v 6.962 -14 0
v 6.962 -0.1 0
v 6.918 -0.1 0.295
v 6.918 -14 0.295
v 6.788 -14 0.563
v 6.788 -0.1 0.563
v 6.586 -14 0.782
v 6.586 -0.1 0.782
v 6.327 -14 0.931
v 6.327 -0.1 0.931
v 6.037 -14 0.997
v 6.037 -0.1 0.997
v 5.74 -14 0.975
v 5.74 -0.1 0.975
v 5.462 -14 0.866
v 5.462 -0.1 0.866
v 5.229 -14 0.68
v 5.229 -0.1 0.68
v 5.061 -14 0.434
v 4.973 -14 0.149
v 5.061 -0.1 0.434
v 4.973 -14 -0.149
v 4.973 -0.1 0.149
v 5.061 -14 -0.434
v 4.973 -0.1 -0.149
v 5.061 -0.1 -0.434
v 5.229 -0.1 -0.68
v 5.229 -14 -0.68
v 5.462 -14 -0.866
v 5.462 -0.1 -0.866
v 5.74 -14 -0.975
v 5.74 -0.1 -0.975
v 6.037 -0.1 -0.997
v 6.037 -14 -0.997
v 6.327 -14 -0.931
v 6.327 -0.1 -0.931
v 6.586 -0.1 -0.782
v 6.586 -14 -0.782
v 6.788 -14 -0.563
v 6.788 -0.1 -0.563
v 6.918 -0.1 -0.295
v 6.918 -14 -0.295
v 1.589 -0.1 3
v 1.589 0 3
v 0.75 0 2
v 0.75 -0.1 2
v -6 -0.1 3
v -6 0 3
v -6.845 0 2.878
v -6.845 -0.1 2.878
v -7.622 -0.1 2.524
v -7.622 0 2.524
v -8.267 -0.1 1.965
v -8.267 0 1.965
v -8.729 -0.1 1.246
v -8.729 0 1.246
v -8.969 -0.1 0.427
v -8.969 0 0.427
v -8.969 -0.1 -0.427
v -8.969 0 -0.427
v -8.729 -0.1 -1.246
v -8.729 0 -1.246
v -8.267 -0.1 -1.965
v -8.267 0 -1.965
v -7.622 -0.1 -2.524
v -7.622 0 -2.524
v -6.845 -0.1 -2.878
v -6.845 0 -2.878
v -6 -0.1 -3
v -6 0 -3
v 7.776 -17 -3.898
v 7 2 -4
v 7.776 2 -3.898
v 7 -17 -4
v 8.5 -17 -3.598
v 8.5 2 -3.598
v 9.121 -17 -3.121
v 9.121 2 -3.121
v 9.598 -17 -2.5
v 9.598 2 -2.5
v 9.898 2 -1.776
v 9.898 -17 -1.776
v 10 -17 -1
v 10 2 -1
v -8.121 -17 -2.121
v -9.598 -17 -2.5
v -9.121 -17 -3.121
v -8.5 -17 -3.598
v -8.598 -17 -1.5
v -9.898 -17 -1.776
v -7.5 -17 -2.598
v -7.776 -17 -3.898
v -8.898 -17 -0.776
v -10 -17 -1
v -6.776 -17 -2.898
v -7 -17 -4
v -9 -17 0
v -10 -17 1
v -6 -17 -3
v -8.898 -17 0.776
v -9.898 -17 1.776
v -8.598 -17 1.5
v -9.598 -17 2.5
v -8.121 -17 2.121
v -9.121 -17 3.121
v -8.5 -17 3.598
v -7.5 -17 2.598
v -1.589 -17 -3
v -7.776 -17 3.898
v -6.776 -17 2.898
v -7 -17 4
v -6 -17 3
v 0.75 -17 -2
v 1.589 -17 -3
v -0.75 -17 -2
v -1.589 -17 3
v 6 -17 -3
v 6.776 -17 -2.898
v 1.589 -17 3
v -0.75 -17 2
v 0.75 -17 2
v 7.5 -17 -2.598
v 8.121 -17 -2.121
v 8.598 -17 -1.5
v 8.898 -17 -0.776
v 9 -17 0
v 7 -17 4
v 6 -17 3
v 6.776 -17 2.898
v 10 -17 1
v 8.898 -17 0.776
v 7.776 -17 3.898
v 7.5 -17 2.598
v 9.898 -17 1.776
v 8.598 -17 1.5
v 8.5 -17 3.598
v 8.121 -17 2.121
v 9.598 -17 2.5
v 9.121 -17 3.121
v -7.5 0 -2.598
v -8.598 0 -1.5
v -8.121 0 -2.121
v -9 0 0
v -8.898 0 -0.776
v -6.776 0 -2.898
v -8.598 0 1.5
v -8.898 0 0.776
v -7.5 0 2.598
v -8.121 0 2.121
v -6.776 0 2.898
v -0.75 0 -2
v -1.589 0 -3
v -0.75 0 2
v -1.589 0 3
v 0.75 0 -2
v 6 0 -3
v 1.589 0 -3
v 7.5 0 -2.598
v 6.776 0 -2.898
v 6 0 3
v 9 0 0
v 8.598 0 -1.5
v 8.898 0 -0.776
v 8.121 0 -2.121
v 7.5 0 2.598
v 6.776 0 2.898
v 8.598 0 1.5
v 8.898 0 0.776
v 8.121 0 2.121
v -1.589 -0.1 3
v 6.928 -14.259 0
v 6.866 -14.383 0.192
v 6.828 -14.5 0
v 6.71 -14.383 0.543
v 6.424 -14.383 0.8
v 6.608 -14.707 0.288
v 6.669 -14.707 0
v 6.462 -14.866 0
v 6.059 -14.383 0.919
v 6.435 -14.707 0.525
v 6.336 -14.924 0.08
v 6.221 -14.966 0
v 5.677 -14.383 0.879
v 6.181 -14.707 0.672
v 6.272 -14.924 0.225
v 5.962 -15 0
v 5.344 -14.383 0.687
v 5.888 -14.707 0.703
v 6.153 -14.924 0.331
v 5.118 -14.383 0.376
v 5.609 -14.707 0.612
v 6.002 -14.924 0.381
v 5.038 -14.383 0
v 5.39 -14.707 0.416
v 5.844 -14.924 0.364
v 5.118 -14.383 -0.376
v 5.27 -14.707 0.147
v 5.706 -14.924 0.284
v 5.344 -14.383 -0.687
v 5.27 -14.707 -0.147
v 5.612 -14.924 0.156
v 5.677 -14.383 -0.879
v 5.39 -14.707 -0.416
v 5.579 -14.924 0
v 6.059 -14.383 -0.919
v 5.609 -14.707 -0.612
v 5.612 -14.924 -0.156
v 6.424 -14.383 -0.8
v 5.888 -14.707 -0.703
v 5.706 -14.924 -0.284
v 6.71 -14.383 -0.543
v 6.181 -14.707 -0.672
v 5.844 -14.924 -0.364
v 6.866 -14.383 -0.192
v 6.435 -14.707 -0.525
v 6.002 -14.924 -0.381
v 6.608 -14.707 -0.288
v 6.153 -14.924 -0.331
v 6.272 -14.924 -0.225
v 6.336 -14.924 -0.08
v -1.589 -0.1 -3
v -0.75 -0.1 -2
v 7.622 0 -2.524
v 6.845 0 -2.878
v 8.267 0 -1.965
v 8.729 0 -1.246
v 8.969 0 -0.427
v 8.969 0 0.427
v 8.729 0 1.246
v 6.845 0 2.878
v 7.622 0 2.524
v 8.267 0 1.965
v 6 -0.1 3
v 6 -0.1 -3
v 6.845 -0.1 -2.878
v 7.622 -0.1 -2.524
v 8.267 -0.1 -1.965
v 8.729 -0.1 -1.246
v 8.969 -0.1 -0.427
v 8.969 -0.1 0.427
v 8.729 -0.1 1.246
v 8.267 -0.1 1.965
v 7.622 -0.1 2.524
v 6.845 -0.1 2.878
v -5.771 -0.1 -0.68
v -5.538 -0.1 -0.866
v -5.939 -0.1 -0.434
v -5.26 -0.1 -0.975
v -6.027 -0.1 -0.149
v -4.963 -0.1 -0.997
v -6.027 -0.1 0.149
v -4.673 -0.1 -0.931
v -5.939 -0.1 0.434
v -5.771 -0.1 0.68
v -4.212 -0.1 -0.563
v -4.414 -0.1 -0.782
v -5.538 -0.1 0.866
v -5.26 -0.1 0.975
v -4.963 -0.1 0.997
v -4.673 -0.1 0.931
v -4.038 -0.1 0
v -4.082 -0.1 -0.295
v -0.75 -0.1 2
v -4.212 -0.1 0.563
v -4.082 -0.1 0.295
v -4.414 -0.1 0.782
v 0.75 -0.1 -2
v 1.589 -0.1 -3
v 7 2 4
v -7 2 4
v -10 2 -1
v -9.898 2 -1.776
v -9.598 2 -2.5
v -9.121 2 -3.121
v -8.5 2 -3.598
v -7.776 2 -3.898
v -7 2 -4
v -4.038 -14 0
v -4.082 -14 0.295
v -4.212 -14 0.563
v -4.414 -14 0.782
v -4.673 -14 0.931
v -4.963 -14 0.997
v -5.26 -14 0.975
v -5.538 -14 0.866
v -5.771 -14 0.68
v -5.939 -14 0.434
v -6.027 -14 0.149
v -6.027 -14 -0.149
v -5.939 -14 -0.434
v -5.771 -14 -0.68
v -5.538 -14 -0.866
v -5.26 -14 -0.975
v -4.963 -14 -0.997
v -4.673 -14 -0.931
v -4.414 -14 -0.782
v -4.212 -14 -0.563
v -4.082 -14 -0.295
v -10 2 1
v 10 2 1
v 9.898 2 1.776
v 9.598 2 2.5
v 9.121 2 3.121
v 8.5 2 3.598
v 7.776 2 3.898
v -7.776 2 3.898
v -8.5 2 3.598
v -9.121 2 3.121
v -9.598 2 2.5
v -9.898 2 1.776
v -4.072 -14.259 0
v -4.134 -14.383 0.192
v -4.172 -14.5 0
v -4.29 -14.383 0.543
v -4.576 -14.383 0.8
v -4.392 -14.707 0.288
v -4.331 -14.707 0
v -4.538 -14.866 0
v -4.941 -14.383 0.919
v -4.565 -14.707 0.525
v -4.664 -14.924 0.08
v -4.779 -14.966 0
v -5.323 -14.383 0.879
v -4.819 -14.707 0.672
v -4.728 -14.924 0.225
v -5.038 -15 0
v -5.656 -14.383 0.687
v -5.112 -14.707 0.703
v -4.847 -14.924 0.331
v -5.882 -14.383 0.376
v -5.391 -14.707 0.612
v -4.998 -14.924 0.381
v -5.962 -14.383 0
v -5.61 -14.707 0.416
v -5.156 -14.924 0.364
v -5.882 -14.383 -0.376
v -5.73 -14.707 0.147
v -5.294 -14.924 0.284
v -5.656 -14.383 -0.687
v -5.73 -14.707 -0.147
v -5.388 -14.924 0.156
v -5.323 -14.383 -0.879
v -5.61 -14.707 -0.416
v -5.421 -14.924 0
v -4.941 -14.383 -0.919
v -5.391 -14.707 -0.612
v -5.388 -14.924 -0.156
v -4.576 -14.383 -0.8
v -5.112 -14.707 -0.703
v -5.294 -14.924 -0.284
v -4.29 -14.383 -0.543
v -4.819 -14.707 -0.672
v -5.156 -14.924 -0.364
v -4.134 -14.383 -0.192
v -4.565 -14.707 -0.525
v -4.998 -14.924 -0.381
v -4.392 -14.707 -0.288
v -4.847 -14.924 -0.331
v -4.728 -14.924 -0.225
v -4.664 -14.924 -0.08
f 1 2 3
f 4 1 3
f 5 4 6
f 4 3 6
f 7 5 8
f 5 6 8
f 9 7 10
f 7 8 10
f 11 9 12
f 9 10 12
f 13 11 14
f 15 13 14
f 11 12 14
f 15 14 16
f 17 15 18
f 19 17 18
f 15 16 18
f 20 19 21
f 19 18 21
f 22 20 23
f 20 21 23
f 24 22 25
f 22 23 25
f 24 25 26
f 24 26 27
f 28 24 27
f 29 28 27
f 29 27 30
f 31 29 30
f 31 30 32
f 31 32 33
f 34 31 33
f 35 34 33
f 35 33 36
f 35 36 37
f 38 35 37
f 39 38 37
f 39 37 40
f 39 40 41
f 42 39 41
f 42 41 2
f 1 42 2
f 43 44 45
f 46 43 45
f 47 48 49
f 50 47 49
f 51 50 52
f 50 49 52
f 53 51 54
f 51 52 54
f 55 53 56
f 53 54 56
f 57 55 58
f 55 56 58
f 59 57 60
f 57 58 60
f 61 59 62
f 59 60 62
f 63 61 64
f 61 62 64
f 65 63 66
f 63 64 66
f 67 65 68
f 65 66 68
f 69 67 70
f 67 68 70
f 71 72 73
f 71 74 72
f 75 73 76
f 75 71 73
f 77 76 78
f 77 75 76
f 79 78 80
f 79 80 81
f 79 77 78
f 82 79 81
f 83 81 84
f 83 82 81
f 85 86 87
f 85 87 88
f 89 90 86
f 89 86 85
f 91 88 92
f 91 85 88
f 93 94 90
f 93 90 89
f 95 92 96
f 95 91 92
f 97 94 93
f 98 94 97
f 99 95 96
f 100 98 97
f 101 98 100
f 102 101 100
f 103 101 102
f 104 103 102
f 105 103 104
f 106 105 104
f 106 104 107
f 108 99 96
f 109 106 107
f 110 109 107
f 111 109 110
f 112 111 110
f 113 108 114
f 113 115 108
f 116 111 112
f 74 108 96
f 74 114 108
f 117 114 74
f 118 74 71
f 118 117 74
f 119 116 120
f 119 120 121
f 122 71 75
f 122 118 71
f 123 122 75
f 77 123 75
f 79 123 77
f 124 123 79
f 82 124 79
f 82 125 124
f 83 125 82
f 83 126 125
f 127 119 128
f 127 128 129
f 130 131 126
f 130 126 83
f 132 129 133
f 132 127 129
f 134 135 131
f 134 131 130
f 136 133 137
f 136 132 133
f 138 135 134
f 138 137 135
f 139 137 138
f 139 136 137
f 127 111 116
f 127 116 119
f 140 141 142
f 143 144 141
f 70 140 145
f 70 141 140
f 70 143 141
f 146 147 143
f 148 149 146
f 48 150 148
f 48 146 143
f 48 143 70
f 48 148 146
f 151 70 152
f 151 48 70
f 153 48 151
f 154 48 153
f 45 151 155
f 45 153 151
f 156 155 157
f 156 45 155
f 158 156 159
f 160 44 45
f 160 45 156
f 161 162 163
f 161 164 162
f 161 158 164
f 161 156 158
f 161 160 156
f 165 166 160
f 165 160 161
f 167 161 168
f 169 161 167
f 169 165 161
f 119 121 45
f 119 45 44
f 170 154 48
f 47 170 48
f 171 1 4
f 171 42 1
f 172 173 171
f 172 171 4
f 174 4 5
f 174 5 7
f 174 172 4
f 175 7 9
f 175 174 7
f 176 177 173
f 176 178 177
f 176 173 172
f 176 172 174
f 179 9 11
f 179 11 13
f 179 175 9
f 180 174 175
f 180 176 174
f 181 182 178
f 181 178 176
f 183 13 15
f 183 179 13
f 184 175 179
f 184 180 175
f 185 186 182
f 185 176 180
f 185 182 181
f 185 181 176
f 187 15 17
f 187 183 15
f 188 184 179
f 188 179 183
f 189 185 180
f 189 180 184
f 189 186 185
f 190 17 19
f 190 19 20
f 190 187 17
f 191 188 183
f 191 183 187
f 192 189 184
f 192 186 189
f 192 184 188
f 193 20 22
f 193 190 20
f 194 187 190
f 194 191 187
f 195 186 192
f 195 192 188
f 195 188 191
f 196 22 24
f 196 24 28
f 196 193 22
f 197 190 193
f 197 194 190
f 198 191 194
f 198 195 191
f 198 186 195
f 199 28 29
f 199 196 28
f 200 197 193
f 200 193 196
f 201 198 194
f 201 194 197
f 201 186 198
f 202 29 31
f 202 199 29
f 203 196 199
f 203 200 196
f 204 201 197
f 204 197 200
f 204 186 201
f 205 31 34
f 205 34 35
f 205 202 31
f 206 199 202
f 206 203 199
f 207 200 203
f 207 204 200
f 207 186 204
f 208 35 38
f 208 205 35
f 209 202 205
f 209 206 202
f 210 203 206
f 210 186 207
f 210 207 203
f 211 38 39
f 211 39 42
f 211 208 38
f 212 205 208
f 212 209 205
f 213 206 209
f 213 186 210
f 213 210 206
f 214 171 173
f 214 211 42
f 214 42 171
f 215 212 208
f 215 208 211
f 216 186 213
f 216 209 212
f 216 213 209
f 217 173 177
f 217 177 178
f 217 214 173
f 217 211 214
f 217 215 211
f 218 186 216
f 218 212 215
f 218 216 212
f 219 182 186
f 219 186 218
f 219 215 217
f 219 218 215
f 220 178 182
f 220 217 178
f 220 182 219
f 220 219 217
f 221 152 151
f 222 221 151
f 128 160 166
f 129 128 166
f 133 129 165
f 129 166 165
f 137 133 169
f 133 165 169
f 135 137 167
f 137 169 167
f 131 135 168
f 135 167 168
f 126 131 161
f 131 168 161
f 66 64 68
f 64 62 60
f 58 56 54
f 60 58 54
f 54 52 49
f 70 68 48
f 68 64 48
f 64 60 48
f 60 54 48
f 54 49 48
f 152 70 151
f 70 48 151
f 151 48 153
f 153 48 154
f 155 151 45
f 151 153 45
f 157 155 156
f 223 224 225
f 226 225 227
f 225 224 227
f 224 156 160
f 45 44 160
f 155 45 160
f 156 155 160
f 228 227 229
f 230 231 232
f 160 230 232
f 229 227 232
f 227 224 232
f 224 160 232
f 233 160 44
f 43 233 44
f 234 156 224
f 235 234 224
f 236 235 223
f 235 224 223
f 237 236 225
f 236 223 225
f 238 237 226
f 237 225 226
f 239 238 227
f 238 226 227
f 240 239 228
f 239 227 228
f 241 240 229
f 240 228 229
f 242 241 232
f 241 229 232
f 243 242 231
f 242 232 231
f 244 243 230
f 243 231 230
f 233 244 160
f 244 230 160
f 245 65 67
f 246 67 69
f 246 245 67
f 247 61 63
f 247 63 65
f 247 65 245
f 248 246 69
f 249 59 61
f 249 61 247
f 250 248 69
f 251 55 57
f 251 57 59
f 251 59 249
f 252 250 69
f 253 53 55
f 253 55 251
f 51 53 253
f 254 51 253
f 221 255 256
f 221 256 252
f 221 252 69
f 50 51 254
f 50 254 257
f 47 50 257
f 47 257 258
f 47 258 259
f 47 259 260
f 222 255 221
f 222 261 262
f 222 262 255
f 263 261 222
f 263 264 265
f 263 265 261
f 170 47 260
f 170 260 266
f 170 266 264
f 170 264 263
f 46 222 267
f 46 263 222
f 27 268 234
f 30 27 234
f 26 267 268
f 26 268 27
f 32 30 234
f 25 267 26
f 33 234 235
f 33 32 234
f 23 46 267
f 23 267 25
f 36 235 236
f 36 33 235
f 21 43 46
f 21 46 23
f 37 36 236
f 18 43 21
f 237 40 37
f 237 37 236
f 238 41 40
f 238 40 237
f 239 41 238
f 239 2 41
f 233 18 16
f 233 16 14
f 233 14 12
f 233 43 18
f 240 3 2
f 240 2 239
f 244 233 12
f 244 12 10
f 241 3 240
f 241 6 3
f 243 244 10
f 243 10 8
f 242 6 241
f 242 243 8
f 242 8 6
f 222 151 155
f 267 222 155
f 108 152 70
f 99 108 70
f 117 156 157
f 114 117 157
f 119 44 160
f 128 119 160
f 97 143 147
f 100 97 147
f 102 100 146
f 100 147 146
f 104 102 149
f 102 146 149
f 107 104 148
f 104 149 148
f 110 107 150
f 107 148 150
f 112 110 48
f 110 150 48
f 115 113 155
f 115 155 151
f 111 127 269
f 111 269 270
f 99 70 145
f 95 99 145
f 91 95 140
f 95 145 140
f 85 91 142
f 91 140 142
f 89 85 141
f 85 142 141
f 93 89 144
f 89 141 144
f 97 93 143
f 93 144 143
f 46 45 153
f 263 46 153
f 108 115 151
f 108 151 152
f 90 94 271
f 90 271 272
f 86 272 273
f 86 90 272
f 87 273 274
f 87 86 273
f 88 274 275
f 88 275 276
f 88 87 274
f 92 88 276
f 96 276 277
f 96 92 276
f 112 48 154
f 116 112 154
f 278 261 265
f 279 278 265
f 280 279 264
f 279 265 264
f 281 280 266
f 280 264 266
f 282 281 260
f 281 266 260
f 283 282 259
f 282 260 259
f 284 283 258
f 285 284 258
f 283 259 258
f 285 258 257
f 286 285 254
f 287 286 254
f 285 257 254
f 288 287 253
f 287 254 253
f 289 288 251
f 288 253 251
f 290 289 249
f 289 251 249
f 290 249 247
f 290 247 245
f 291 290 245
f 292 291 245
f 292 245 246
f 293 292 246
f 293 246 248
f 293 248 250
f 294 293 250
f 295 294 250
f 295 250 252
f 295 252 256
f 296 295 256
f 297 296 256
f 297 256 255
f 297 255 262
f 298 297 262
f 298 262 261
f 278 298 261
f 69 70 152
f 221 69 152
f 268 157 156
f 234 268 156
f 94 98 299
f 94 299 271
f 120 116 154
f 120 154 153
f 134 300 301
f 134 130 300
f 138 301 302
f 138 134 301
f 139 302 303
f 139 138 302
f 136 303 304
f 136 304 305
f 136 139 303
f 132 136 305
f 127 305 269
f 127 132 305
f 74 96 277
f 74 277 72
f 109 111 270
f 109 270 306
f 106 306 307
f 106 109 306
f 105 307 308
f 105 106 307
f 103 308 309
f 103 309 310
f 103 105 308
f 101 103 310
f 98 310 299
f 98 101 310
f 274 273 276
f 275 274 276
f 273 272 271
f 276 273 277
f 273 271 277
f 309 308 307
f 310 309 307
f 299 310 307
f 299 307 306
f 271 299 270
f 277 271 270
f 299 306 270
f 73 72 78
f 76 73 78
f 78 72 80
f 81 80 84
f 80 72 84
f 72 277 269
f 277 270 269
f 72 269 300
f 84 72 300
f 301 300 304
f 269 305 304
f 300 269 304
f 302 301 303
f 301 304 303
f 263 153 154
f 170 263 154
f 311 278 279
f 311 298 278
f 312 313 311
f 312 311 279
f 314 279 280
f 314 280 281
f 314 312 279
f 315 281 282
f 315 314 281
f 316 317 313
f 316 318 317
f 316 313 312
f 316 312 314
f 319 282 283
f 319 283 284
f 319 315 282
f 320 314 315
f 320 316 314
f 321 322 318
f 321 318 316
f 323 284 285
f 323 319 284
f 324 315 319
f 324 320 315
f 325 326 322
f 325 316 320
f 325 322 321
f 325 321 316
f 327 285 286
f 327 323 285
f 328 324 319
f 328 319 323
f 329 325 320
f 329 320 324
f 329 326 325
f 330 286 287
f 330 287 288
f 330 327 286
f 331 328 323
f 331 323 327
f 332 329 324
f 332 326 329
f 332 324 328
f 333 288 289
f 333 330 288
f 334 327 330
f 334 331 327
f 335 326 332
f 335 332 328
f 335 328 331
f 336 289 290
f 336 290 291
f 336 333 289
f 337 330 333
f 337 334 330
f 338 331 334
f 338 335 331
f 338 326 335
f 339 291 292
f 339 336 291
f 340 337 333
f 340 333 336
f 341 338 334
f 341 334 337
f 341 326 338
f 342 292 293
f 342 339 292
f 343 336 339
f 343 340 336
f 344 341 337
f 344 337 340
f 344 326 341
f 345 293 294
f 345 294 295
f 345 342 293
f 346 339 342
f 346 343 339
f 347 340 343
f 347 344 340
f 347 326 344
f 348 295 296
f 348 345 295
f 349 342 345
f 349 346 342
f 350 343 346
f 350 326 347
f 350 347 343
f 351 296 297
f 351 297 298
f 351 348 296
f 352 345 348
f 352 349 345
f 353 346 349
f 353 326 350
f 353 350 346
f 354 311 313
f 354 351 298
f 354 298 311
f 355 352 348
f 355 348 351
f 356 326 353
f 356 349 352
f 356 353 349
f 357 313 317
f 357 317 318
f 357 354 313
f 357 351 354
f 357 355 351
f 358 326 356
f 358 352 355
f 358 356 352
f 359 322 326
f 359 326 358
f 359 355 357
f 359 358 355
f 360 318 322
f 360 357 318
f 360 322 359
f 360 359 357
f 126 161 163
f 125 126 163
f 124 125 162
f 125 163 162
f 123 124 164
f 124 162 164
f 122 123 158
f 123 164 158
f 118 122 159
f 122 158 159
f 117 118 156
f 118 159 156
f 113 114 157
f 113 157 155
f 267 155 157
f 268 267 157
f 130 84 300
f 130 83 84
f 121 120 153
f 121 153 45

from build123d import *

# Parameters (mm, degrees)
F1_DEPTH = 17
F2_R     = 1
F3_DEPTH = 15
F4_R     = 1
F4_2_R   = 1
F6_DEPTH = 2
F8_DEPTH = 0.1


with BuildPart() as f1:
    # F0 (on Front) → F1 (new body)
    with BuildSketch(Plane.XZ):
        with BuildLine():
            ThreePointArc((10, 1), (9.1213203436, 3.1213203436), (7, 4))
            Line((7, 4), (-7, 4))
            ThreePointArc((-7, 4), (-9.1213203436, 3.1213203436), (-10, 1))
            Line((-10, 1), (-10, -1))
            ThreePointArc((-10, -1), (-9.1213203436, -3.1213203436), (-7, -4))
            Line((-7, -4), (7, -4))
            ThreePointArc((7, -4), (9.1213203436, -3.1213203436), (10, -1))
            Line((10, -1), (10, 1))
        make_face()
        with BuildLine():
            ThreePointArc((-9, 0), (-8.1213203436, 2.1213203436), (-6, 3))
            Line((-6, 3), (-1.5890996312, 3))
            Line((-1.5890996312, 3), (-0.75, 2))
            Line((-0.75, 2), (0, 2))
            Line((0, 2), (0.75, 2))
            Line((0.75, 2), (1.5890996312, 3))
            Line((1.5890996312, 3), (6, 3))
            ThreePointArc((6, 3), (8.1213203436, 2.1213203436), (9, 0))
            ThreePointArc((9, 0), (8.1213203436, -2.1213203436), (6, -3))
            Line((6, -3), (1.5890996312, -3))
            Line((1.5890996312, -3), (0.75, -2))
            Line((0.75, -2), (0, -2))
            Line((0, -2), (-0.75, -2))
            Line((-0.75, -2), (-1.5890996312, -3))
            Line((-1.5890996312, -3), (-6, -3))
            ThreePointArc((-6, -3), (-8.1213203436, -2.1213203436), (-9, 0))
        make_face(mode=Mode.SUBTRACT)
    extrude(amount=F1_DEPTH)

    # F5 (on face) → F6 (join)
    with BuildSketch(Plane.XZ):
        with BuildLine():
            ThreePointArc((10, 1), (9.1213203436, 3.1213203436), (7, 4))
            Line((7, 4), (-7, 4))
            ThreePointArc((-7, 4), (-9.1213203436, 3.1213203436), (-10, 1))
            Line((-10, 1), (-10, -1))
            ThreePointArc((-10, -1), (-9.1213203436, -3.1213203436), (-7, -4))
            Line((-7, -4), (7, -4))
            ThreePointArc((7, -4), (9.1213203436, -3.1213203436), (10, -1))
            Line((10, -1), (10, 1))
        make_face()
    extrude(amount=-F6_DEPTH)


with BuildPart() as f3:
    # F2 (on Front) → F3 (new body)
    with BuildSketch(Plane.XZ):
        with Locations((-5.0379058985, 0)):
            Circle(F2_R)
    extrude(amount=F3_DEPTH)

    # F4
    f4_edges = [f3.edges().sort_by_distance(p)[0] for p in [
        (-6.037906, -15, 0),
    ]]
    fillet(f4_edges, radius=F4_R)



with BuildPart() as f3b:
    # F2 (on Front) → F3, piece 2 (new body)
    with BuildSketch(Plane.XZ):
        with Locations((5.9620941015, 0)):
            Circle(F2_R)
    extrude(amount=F3_DEPTH)

    # F4#2
    f4_2_edges = [f3b.edges().sort_by_distance(p)[0] for p in [
        (4.962094, -15, 0),
    ]]
    fillet(f4_2_edges, radius=F4_2_R)


with BuildPart() as f3_1:
    add(f3.part)

    add(f3b.part)  # F8 merges F3b
    # F7 (on face) → F8 (join)
    with BuildSketch(Plane.XZ):
        with BuildLine():
            Line((-0.75, 2), (-1.5890996312, 3))
            Line((-1.5890996312, 3), (-6, 3))
            ThreePointArc((-6, 3), (-9, 0), (-6, -3))
            Line((-6, -3), (-1.5890996312, -3))
            Line((-1.5890996312, -3), (-0.75, -2))
            Line((-0.75, -2), (0.75, -2))
            Line((0.75, -2), (1.5890996312, -3))
            Line((1.5890996312, -3), (6, -3))
            ThreePointArc((6, -3), (9, 0), (6, 3))
            Line((6, 3), (1.5890996312, 3))
            Line((1.5890996312, 3), (0.75, 2))
            Line((0.75, 2), (-0.75, 2))
        make_face()
    extrude(amount=F8_DEPTH)


solid = Compound([f1.part, f3_1.part])
